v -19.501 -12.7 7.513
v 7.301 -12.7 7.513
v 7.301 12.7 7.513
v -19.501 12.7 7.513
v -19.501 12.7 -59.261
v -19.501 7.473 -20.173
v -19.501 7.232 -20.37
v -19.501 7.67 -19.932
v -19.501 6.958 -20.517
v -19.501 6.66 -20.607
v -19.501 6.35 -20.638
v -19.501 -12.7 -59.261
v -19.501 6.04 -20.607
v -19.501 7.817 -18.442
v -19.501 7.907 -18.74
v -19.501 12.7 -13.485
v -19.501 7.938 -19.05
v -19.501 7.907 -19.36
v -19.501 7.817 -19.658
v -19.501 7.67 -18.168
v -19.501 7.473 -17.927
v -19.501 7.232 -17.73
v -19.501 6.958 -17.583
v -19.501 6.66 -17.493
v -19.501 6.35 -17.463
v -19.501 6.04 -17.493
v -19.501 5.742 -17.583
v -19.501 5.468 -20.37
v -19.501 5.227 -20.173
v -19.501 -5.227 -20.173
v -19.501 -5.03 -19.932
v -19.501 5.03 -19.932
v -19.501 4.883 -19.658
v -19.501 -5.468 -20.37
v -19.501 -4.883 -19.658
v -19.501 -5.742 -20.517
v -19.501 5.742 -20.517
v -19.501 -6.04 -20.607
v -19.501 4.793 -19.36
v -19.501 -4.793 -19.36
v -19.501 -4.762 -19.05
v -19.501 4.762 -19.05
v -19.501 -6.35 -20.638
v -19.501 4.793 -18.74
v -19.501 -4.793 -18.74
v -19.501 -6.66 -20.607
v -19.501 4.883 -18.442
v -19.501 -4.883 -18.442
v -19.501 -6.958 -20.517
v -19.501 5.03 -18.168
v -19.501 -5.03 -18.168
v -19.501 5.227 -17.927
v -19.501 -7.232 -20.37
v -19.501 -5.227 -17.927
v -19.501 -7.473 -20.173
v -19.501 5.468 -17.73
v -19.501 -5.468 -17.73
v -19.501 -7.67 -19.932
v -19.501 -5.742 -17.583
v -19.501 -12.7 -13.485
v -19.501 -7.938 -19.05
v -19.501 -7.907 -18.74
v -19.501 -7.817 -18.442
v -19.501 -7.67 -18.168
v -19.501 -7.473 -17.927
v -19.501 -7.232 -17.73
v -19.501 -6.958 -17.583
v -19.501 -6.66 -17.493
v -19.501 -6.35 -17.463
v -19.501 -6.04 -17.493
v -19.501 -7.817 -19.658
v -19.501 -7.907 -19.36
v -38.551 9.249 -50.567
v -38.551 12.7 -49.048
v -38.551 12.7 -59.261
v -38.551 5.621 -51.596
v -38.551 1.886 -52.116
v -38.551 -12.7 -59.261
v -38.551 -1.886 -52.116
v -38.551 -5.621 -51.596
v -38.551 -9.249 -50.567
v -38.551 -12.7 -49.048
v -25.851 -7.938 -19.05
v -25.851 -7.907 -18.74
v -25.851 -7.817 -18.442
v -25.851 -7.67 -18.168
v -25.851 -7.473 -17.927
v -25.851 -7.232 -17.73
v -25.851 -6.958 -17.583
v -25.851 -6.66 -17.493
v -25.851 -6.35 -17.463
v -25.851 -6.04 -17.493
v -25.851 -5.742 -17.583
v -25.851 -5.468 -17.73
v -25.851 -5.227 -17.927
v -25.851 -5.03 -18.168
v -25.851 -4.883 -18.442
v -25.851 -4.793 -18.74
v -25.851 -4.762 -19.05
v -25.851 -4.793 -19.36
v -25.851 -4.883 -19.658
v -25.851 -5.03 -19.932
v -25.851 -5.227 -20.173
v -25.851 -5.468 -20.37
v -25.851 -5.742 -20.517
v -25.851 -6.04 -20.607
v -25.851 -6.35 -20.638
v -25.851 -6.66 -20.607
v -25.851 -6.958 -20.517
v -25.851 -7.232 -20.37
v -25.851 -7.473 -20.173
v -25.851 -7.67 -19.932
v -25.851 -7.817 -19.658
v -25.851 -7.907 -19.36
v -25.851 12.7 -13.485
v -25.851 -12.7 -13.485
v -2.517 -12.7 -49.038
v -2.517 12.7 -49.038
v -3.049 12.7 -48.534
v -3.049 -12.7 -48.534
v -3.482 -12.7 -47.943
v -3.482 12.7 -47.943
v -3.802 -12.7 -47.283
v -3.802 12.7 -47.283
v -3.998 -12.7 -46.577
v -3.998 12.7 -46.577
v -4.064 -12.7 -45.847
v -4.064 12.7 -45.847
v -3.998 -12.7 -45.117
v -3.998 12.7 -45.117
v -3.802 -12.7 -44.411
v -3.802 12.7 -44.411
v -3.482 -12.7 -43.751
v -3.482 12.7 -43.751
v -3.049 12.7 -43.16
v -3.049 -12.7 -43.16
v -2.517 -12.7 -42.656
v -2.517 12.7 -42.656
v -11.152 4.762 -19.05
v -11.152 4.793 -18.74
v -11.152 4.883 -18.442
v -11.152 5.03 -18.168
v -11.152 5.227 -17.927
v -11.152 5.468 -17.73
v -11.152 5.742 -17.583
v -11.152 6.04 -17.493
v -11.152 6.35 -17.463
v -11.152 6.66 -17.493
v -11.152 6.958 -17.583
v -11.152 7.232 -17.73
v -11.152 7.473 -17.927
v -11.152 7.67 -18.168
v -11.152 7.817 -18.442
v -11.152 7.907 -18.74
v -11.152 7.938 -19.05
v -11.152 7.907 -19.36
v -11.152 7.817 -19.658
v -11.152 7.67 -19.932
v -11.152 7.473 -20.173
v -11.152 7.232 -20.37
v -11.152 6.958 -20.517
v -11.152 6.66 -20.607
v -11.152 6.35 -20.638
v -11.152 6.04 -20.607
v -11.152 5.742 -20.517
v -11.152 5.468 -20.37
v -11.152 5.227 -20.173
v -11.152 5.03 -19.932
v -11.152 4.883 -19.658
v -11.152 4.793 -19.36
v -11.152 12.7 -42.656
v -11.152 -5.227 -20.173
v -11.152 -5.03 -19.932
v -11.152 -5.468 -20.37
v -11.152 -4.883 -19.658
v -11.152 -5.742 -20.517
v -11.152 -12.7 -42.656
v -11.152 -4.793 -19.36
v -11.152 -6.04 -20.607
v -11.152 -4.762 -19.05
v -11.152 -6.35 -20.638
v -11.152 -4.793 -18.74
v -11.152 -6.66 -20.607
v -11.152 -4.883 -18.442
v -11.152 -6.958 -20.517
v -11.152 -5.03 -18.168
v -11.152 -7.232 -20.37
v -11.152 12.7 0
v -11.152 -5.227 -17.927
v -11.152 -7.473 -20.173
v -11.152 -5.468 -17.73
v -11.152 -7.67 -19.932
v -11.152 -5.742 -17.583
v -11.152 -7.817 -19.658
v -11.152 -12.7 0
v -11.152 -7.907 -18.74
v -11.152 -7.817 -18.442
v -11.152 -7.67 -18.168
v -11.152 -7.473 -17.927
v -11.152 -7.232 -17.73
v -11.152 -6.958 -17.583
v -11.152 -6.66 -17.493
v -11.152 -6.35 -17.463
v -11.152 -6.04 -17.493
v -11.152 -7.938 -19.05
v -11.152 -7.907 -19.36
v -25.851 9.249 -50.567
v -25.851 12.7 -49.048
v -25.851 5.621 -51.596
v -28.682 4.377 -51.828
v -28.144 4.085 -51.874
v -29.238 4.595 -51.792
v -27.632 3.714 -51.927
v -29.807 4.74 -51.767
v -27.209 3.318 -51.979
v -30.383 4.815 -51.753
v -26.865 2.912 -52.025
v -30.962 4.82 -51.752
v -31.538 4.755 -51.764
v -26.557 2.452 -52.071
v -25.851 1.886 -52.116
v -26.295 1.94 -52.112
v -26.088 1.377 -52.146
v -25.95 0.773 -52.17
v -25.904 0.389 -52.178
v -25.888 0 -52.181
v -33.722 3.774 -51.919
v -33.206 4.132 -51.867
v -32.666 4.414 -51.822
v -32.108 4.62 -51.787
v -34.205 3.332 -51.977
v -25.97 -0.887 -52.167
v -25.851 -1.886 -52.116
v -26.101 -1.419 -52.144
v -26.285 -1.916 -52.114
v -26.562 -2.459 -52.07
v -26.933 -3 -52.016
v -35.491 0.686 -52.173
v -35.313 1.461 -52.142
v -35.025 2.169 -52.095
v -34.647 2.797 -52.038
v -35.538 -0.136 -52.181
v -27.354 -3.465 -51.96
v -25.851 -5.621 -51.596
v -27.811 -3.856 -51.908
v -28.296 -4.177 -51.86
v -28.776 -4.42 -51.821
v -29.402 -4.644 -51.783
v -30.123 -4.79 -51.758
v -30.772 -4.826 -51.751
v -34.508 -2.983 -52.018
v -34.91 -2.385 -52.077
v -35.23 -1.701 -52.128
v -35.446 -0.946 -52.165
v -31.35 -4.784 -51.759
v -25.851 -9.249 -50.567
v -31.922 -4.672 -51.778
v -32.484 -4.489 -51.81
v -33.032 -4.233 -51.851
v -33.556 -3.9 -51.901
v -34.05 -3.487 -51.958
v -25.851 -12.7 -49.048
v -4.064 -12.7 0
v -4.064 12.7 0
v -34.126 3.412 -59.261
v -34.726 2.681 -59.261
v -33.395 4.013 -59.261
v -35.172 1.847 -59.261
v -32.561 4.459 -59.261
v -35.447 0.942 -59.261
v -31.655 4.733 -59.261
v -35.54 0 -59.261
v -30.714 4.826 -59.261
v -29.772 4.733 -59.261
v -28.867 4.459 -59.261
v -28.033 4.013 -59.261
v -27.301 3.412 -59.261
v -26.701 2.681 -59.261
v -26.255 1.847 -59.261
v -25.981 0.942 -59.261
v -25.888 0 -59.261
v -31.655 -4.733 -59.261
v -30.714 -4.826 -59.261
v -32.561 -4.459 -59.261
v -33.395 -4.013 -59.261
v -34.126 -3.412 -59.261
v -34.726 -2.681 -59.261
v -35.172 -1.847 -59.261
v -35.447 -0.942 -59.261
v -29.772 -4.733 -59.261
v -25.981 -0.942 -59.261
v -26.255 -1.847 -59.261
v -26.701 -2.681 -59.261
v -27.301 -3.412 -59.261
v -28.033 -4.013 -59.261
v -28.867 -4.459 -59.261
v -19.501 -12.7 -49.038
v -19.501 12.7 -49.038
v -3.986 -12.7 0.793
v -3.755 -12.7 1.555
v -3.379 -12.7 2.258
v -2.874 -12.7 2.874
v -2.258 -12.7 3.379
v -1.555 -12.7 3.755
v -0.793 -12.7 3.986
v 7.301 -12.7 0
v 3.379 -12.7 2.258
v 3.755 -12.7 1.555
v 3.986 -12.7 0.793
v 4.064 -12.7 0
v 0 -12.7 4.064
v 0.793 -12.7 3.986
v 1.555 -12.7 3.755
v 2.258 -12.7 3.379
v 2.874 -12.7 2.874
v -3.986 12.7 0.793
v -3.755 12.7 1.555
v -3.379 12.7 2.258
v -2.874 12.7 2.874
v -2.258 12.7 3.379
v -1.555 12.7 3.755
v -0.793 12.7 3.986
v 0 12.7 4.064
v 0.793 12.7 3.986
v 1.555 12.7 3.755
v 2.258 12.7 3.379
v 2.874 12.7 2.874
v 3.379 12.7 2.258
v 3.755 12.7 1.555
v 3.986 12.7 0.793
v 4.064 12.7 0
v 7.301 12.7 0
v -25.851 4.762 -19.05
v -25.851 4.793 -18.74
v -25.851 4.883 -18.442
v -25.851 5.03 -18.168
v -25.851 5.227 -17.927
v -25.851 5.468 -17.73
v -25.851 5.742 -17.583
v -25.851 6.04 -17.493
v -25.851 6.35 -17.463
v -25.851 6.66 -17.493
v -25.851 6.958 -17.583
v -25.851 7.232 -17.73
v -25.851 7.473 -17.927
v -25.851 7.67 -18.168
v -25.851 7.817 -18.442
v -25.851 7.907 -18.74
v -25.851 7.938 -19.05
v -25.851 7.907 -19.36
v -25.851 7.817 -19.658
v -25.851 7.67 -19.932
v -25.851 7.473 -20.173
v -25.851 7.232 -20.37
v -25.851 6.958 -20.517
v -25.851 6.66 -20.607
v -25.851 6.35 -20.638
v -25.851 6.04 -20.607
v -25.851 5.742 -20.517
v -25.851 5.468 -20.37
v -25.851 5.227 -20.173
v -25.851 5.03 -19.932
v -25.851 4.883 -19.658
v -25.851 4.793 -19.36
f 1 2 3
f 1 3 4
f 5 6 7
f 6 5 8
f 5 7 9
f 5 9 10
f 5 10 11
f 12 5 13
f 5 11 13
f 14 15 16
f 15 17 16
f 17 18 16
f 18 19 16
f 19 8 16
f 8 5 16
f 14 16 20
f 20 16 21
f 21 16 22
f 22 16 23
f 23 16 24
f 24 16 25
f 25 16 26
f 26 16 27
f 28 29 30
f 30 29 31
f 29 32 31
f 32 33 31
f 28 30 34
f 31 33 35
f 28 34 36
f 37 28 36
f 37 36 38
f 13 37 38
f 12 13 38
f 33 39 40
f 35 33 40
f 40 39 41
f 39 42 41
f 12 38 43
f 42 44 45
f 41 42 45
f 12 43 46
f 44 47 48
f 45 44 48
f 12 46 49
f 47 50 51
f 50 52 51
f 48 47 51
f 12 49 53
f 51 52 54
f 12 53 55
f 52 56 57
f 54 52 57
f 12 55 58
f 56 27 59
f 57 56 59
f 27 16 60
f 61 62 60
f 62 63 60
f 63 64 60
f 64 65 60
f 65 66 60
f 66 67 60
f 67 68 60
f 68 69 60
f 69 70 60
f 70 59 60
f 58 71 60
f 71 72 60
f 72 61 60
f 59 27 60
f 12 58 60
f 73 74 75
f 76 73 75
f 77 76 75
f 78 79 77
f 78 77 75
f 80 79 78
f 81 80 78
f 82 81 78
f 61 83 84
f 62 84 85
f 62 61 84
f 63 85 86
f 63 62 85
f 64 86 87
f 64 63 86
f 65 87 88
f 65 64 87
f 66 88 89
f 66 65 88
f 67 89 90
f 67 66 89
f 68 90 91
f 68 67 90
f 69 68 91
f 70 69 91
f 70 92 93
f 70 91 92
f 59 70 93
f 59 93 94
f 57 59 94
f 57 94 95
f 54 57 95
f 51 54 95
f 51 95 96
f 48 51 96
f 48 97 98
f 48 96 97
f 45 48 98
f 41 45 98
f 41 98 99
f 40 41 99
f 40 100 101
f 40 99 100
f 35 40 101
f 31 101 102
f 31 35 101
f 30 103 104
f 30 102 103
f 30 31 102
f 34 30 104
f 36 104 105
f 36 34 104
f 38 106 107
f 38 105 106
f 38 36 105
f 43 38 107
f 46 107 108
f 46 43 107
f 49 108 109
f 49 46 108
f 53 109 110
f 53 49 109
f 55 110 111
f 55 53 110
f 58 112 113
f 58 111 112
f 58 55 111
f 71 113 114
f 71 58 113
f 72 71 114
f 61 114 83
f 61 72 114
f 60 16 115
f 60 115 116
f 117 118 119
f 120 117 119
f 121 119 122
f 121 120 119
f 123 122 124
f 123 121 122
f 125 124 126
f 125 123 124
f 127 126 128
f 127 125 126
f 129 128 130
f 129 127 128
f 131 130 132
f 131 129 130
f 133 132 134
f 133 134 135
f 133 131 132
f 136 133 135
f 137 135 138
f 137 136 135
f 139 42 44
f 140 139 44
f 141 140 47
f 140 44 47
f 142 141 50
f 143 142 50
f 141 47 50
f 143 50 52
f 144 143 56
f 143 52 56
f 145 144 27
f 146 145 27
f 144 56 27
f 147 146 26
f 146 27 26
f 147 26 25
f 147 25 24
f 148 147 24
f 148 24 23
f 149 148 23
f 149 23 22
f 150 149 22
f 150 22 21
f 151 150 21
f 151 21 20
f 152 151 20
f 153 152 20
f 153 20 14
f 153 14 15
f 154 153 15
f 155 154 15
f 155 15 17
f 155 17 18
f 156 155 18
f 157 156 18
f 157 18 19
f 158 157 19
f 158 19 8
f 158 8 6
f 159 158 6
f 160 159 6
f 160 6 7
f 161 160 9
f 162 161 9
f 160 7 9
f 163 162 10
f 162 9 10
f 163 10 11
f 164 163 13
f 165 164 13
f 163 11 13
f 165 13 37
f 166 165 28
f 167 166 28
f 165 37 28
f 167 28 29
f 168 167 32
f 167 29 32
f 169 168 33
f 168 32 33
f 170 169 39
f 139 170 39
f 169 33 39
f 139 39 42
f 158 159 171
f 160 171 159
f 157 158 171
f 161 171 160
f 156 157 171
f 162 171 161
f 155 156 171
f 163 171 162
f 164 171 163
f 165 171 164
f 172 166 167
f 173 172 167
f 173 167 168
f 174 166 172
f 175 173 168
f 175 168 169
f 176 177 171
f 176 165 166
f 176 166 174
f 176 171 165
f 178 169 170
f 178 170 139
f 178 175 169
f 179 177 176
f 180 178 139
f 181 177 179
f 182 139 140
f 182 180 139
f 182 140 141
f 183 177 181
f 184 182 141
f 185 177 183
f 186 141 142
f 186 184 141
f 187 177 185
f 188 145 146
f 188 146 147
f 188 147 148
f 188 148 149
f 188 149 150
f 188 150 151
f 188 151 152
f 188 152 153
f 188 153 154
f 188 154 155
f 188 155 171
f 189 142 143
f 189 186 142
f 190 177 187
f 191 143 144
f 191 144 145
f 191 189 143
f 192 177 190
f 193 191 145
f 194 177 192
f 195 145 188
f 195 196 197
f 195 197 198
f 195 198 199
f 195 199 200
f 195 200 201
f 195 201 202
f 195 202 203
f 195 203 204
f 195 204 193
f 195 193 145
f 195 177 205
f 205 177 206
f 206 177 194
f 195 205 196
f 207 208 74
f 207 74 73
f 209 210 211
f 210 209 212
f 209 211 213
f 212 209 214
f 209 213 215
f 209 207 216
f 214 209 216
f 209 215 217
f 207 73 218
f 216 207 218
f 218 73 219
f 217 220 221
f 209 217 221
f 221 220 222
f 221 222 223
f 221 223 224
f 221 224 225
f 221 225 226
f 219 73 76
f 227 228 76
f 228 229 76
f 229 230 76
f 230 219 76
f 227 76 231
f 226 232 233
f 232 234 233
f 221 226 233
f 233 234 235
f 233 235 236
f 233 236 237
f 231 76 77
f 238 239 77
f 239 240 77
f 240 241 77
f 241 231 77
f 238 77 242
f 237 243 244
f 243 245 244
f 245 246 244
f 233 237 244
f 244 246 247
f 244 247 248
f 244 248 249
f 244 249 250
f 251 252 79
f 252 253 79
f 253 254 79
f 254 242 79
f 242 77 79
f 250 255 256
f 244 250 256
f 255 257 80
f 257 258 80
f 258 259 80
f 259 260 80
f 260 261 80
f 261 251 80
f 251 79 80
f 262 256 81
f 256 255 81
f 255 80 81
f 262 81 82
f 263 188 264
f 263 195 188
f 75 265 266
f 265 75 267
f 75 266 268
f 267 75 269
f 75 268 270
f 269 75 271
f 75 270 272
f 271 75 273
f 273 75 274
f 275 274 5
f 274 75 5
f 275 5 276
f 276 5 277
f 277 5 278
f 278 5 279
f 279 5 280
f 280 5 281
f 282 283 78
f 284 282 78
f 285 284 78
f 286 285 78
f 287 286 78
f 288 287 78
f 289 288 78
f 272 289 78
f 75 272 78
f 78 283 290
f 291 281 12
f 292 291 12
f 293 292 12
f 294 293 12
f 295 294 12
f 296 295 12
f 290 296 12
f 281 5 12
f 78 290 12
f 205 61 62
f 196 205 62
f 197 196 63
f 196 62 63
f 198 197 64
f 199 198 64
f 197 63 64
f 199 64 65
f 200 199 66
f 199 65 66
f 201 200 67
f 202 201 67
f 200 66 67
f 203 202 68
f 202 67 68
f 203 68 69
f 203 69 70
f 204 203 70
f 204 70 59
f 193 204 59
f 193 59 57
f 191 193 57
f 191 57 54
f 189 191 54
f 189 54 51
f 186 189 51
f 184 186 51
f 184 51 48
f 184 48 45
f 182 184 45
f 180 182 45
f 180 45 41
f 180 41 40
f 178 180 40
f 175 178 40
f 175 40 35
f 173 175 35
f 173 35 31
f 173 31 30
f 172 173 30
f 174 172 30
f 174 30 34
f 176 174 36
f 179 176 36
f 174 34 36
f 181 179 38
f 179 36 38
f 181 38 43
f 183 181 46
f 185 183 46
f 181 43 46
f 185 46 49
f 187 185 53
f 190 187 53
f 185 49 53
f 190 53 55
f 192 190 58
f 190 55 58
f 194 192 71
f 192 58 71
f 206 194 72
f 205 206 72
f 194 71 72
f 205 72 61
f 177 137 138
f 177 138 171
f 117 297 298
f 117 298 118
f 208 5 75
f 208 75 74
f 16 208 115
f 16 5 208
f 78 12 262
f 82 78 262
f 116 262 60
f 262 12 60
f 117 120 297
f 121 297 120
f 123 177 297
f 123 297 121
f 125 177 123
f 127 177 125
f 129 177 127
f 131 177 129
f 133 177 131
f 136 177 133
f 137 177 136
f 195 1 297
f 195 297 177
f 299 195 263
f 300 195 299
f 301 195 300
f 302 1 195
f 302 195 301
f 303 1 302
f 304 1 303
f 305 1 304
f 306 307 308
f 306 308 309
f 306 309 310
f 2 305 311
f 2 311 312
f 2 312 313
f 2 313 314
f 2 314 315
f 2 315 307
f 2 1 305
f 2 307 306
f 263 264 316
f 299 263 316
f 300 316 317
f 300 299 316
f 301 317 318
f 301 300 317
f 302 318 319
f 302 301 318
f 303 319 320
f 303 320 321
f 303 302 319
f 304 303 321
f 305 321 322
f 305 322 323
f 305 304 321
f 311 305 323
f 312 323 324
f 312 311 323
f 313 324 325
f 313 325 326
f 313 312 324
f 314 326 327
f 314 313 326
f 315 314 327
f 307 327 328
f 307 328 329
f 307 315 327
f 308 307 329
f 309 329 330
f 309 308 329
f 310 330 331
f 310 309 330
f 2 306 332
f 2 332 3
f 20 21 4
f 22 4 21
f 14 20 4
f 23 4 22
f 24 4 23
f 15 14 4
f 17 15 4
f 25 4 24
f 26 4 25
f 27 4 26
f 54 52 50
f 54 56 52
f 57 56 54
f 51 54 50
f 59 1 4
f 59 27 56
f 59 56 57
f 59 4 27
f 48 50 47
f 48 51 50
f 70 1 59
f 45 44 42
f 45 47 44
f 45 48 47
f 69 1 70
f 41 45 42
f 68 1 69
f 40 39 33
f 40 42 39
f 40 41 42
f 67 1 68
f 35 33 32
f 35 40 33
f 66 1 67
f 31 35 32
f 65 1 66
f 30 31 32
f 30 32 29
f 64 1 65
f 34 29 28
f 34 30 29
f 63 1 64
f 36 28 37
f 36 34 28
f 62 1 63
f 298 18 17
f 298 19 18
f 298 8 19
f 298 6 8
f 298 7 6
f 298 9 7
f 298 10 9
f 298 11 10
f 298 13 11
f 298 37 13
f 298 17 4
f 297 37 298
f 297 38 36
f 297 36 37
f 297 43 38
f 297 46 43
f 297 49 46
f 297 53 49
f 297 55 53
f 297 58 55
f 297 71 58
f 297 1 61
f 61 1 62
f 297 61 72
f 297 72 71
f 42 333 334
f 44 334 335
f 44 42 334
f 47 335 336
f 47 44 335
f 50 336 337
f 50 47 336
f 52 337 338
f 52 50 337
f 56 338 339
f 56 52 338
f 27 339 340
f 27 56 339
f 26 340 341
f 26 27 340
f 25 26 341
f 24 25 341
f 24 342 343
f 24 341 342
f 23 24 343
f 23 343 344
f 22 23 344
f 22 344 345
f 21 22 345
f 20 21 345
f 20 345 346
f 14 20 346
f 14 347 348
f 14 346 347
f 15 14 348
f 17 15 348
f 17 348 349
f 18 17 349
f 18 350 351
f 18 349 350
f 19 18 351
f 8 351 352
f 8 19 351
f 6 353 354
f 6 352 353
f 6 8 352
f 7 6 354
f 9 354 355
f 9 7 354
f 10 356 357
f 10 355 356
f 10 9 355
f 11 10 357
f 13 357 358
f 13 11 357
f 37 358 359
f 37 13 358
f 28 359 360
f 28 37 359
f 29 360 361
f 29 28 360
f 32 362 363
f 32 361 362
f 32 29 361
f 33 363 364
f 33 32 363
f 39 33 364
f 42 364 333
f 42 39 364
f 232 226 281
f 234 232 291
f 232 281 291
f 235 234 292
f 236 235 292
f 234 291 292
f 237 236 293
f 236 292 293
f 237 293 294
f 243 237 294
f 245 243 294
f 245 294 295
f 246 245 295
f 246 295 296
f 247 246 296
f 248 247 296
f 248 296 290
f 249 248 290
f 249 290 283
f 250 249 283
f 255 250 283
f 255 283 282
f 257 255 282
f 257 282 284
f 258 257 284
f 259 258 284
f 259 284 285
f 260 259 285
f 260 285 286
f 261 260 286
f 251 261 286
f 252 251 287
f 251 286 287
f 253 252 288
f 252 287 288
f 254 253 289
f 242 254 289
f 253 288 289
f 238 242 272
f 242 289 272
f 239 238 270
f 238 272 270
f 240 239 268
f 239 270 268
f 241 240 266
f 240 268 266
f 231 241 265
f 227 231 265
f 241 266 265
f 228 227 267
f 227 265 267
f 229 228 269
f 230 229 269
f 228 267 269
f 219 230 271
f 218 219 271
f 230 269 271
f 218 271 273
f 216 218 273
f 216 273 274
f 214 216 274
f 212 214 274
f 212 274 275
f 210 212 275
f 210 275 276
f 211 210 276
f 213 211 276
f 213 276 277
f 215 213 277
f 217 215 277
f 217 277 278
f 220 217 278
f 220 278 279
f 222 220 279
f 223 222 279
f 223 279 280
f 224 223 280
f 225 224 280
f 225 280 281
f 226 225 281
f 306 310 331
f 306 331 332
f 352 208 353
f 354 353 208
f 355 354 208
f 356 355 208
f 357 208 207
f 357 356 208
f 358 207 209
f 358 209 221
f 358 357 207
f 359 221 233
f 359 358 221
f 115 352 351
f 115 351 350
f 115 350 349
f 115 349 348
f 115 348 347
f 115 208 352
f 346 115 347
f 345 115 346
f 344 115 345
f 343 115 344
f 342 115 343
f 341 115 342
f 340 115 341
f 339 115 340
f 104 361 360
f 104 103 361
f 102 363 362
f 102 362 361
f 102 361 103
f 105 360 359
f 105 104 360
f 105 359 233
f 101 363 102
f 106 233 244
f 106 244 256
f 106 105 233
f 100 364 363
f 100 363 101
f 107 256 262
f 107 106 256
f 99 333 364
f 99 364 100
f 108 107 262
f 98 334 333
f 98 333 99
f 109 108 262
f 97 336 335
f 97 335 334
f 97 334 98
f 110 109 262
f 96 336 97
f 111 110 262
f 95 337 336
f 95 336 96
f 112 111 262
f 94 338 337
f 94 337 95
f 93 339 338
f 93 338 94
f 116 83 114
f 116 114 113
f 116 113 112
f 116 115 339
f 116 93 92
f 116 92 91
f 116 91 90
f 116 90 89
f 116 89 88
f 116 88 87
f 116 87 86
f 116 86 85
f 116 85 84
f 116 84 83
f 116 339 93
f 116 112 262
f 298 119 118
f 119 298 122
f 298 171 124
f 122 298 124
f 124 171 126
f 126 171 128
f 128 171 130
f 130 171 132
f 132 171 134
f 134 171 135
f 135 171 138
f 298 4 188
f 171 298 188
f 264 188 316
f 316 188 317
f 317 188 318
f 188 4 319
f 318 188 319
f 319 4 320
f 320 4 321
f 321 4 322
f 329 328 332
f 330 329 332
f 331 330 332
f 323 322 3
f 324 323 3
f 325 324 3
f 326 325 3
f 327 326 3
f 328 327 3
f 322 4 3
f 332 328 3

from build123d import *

# Parameters (mm, degrees)
F1_DEPTH = 12.7
F2_R     = 1.5875
F3_DEPTH = 26.802816
F4_W     = 25.4
F4_H     = 45.776122
F4_R     = 1.5875
F5_DEPTH = 19.05
F6_R     = 27.305
F7_DEPTH = 12.7
F8_R     = 4.826
F9_DEPTH = 12.7


with BuildPart() as f1:
    # F0 (on Front) → F1 (new body, symmetric)
    with BuildSketch(Plane.XZ):
        with BuildLine():
            ThreePointArc((-4.064, 0), (0, 4.064), (4.064, 0))
            Line((4.064, 0), (7.300605, 0))
            Line((7.300605, 0), (7.300605, 7.512905))
            Line((7.300605, 7.512905), (-19.501211, 7.512905))
            Line((-19.501211, 7.512905), (-19.501211, -49.03813))
            Line((-19.501211, -49.03813), (-2.516502, -49.03813))
            ThreePointArc((-2.516502, -49.03813), (-4.064, -45.847), (-2.516502, -42.65587))
            Line((-2.516502, -42.65587), (-11.152196, -42.65587))
            Line((-11.152196, -42.65587), (-11.152196, 0))
            Line((-11.152196, 0), (-4.064, 0))
        make_face()
    extrude(amount=F1_DEPTH, both=True)

    # F2 (on face) → F3 (cut, through all)
    with BuildSketch(Plane(origin=(-19.501211, 0, 0), x_dir=(0, -1, 0), z_dir=(-1, 0, 0))):
        with Locations((-6.35, -19.05)):
            Circle(F2_R)
        with Locations((6.35, -19.05)):
            Circle(F2_R)
    extrude(amount=-F3_DEPTH, mode=Mode.SUBTRACT)


with BuildPart() as f5:
    # F4 (on face) → F5 (new body)
    with BuildSketch(Plane(origin=(-19.501211, 0, 0), x_dir=(0, -1, 0), z_dir=(-1, 0, 0))):
        with Locations((0, -36.372903)):
            Rectangle(F4_W, F4_H)
        with Locations((-6.35, -19.05)):
            Circle(F4_R, mode=Mode.SUBTRACT)
        with Locations((6.35, -19.05)):
            Circle(F4_R, mode=Mode.SUBTRACT)
    extrude(amount=F5_DEPTH)

    # F6 (on face) → F7 (cut)
    with BuildSketch(Plane(origin=(-38.551211, 0, 0), x_dir=(0, -1, 0), z_dir=(-1, 0, 0))):
        with Locations((0, -24.876134)):
            Circle(F6_R)
    extrude(amount=-F7_DEPTH, mode=Mode.SUBTRACT)

    # F8 (on face) → F9 (cut)
    with BuildSketch(Plane(origin=(0, 0, -59.260964), x_dir=(1, 0, 0), z_dir=(0, 0, -1))):
        with Locations((-30.713812, 0)):
            Circle(F8_R)
    extrude(amount=-F9_DEPTH, mode=Mode.SUBTRACT)


solid = Compound([f1.part, f5.part])
